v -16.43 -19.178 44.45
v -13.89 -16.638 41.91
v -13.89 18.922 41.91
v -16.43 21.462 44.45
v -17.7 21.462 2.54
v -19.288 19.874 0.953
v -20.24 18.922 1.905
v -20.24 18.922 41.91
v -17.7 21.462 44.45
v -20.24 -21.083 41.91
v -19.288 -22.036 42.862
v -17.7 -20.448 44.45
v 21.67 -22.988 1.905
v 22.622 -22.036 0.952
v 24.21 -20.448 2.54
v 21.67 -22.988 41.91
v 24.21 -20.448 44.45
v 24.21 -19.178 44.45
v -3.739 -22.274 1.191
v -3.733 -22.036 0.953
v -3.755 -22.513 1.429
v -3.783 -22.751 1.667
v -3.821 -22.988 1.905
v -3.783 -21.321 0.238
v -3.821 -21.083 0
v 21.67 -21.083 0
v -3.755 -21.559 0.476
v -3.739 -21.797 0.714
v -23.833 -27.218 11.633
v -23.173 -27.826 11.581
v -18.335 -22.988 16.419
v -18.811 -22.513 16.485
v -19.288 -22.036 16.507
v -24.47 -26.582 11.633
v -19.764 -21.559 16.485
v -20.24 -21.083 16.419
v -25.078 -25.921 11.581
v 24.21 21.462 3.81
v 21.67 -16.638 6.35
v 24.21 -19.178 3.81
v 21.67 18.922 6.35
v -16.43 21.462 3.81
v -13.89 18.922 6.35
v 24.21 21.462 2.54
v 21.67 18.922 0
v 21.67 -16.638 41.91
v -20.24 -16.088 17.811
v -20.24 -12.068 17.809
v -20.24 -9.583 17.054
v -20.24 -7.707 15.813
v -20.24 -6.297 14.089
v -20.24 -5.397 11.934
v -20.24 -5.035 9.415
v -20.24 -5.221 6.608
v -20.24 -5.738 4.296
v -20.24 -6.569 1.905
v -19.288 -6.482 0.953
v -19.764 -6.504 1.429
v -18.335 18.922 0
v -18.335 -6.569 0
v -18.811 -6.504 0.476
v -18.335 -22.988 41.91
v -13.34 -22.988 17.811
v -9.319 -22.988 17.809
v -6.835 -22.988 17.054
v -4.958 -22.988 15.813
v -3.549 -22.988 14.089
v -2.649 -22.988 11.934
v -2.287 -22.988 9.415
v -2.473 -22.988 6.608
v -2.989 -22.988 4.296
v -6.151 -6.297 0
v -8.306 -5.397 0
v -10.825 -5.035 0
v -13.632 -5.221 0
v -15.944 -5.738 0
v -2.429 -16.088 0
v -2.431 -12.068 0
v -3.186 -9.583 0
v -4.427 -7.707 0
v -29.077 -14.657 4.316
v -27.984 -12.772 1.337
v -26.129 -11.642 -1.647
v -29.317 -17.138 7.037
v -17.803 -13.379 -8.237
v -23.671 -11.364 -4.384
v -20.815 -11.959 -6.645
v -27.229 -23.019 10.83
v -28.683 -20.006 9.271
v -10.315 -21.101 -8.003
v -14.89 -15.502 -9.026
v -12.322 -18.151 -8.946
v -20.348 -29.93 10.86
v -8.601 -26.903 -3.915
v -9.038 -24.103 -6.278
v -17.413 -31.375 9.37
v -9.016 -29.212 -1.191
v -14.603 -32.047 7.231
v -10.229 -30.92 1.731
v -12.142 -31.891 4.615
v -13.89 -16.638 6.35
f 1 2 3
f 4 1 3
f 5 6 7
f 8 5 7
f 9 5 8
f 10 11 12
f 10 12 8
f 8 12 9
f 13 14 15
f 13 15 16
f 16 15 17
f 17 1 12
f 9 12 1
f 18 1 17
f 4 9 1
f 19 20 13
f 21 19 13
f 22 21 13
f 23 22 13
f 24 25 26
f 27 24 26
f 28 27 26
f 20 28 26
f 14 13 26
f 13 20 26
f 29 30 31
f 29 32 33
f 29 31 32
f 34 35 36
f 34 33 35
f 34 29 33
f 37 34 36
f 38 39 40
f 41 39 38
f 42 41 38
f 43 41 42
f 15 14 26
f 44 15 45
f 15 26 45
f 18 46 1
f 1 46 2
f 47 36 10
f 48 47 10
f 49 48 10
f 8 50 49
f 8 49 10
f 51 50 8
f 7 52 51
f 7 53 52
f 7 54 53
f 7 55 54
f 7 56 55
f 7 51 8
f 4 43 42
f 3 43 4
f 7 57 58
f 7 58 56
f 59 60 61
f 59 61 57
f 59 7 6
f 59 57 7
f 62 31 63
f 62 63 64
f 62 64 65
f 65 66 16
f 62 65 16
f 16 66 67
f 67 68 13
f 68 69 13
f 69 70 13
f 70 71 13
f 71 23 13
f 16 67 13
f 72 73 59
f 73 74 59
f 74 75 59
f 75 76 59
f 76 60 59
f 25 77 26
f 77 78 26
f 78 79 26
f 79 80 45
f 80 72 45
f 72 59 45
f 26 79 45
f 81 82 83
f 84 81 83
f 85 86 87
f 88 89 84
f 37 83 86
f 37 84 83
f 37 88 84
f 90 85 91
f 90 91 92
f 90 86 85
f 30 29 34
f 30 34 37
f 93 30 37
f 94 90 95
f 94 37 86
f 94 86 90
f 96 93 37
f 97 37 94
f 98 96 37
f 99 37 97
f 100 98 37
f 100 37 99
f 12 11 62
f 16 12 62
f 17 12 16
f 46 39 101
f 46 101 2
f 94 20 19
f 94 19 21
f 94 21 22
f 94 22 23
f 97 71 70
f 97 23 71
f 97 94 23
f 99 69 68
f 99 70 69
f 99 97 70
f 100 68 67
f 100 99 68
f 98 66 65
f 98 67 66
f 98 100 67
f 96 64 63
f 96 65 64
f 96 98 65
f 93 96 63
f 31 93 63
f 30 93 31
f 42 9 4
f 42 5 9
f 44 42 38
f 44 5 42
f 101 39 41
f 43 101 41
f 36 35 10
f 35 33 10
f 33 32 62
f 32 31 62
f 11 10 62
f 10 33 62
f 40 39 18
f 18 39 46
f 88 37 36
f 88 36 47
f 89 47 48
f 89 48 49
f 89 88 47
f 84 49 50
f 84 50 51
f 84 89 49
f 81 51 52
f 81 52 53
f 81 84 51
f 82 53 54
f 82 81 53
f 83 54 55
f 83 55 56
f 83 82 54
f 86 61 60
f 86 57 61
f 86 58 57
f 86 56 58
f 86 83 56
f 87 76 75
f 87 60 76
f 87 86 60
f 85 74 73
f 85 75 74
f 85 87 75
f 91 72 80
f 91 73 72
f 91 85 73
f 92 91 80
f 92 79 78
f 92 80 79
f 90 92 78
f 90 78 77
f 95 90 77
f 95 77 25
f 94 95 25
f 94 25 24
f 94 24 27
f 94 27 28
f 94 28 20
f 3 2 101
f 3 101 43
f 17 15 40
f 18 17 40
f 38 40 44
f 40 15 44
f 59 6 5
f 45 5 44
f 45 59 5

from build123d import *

# Parameters (mm, degrees)
F0_W     = 44.45
F0_H     = 44.45
F1_DEPTH = 44.45
F2_SIZE  = 1.905
F4_DEPTH = 25.4
F5_W     = 38.1
F5_H     = 38.1
F6_DEPTH = 38.1
F7_SIZE  = 2.54


with BuildPart() as f1:
    # F0 (on Top) → F1 (new body)
    with BuildSketch(Plane.XY):
        with Locations((1.98498182, -0.7634516805)):
            Rectangle(F0_W, F0_H)
    extrude(amount=F1_DEPTH)

    # F2
    f2_edges = [f1.edges().sort_by_distance(p)[0] for p in [
        (-20.240018, -22.988452, 22.225),
        (1.984982, -22.988452, 0),
        (-20.240018, -0.763452, 0),
    ]]
    chamfer(f2_edges, length=F2_SIZE)

    # F3 (on face) → F4 (join)
    with BuildSketch(Plane(origin=(-13.1394899535, -13.1394899535, -13.1394899535), x_dir=(0.8164965809, -0.4082482905, -0.4082482905), z_dir=(-0.5773502692, -0.5773502692, -0.5773502692))):
        with BuildLine():
            Line((-8.6963355296, 16.2552900723), (-7.5297660396, 16.9288092814))
            Line((-7.5297660396, 16.9288092814), (-6.3631965496, 17.6023284905))
            Line((-6.3631965496, 17.6023284905), (-12.2885202748, 27.8652902339))
            ThreePointArc((-12.2885202748, 27.8652902339), (-13.4909095429, 27.2538127004), (-14.6216592548, 26.5182518157))
            Line((-14.6216592548, 26.5182518157), (-8.6963355296, 16.2552900723))
        make_face()
        with BuildLine():
            Line((-6.3631965496, 17.6023284905), (-7.1409095429, 16.2552900723))
            Line((-7.1409095429, 16.2552900723), (-8.6963355296, 16.2552900723))
            Line((-8.6963355296, 16.2552900723), (-14.6216592548, 26.5182518157))
            ThreePointArc((-14.6216592548, 26.5182518157), (-12.8978392219, 4.935053296), (5.5590904571, 16.2552900723))
            ThreePointArc((5.5590904571, 16.2552900723), (-0.2157617573, 26.9010558103), (-12.2885202748, 27.8652902339))
            Line((-12.2885202748, 27.8652902339), (-6.3631965496, 17.6023284905))
        make_face()
        Polygon((-7.1409095429, 16.2552900723), (-7.5297660396, 16.9288092814), (-8.6963355296, 16.2552900723), align=None)
        Polygon((-6.3631965496, 17.6023284905), (-7.5297660396, 16.9288092814), (-7.1409095429, 16.2552900723), align=None)
    extrude(amount=-F4_DEPTH)

    # F5 (on face) → F6 (cut)
    with BuildSketch(Plane.YZ.offset(24.20998182)):
        with Locations((2.4115483195, 25.4)):
            Rectangle(F5_W, F5_H)
    extrude(amount=-F6_DEPTH, mode=Mode.SUBTRACT)

    # F7 (call 1 of 4: OpenCascade refuses the feature's edges together)
    f7_edges = [f1.edges().sort_by_distance(p)[0] for p in [
        (-20.240018, 21.461548, 23.1775),
        (-20.240018, 0.189048, 44.45),
    ]]
    chamfer(f7_edges, length=F7_SIZE)

    # F7#2 (call 2 of 4)
    f7_2_edges = [f1.edges().sort_by_distance(p)[0] for p in [
        (2.937482, 21.461548, 0),
        (24.209982, 0.189048, 0),
    ]]
    chamfer(f7_2_edges, length=F7_SIZE)

    # F7#3 (call 3 of 4)
    f7_3_edges = [f1.edges().sort_by_distance(p)[0] for p in [
        (2.937482, -22.988452, 44.45),
        (24.209982, -22.988452, 23.1775),
    ]]
    chamfer(f7_3_edges, length=F7_SIZE)

    # F7#4 (call 4 of 4)
    f7_4_edges = [f1.edges().sort_by_distance(p)[0] for p in [
        (5.159982, 21.461548, 6.35),
        (24.209982, 2.411548, 6.35),
        (24.209982, -16.638452, 25.4),
        (5.159982, -16.638452, 44.45),
        (-13.890018, 2.411548, 44.45),
        (-13.890018, 21.461548, 25.4),
    ]]
    chamfer(f7_4_edges, length=F7_SIZE)


solid = f1.part
